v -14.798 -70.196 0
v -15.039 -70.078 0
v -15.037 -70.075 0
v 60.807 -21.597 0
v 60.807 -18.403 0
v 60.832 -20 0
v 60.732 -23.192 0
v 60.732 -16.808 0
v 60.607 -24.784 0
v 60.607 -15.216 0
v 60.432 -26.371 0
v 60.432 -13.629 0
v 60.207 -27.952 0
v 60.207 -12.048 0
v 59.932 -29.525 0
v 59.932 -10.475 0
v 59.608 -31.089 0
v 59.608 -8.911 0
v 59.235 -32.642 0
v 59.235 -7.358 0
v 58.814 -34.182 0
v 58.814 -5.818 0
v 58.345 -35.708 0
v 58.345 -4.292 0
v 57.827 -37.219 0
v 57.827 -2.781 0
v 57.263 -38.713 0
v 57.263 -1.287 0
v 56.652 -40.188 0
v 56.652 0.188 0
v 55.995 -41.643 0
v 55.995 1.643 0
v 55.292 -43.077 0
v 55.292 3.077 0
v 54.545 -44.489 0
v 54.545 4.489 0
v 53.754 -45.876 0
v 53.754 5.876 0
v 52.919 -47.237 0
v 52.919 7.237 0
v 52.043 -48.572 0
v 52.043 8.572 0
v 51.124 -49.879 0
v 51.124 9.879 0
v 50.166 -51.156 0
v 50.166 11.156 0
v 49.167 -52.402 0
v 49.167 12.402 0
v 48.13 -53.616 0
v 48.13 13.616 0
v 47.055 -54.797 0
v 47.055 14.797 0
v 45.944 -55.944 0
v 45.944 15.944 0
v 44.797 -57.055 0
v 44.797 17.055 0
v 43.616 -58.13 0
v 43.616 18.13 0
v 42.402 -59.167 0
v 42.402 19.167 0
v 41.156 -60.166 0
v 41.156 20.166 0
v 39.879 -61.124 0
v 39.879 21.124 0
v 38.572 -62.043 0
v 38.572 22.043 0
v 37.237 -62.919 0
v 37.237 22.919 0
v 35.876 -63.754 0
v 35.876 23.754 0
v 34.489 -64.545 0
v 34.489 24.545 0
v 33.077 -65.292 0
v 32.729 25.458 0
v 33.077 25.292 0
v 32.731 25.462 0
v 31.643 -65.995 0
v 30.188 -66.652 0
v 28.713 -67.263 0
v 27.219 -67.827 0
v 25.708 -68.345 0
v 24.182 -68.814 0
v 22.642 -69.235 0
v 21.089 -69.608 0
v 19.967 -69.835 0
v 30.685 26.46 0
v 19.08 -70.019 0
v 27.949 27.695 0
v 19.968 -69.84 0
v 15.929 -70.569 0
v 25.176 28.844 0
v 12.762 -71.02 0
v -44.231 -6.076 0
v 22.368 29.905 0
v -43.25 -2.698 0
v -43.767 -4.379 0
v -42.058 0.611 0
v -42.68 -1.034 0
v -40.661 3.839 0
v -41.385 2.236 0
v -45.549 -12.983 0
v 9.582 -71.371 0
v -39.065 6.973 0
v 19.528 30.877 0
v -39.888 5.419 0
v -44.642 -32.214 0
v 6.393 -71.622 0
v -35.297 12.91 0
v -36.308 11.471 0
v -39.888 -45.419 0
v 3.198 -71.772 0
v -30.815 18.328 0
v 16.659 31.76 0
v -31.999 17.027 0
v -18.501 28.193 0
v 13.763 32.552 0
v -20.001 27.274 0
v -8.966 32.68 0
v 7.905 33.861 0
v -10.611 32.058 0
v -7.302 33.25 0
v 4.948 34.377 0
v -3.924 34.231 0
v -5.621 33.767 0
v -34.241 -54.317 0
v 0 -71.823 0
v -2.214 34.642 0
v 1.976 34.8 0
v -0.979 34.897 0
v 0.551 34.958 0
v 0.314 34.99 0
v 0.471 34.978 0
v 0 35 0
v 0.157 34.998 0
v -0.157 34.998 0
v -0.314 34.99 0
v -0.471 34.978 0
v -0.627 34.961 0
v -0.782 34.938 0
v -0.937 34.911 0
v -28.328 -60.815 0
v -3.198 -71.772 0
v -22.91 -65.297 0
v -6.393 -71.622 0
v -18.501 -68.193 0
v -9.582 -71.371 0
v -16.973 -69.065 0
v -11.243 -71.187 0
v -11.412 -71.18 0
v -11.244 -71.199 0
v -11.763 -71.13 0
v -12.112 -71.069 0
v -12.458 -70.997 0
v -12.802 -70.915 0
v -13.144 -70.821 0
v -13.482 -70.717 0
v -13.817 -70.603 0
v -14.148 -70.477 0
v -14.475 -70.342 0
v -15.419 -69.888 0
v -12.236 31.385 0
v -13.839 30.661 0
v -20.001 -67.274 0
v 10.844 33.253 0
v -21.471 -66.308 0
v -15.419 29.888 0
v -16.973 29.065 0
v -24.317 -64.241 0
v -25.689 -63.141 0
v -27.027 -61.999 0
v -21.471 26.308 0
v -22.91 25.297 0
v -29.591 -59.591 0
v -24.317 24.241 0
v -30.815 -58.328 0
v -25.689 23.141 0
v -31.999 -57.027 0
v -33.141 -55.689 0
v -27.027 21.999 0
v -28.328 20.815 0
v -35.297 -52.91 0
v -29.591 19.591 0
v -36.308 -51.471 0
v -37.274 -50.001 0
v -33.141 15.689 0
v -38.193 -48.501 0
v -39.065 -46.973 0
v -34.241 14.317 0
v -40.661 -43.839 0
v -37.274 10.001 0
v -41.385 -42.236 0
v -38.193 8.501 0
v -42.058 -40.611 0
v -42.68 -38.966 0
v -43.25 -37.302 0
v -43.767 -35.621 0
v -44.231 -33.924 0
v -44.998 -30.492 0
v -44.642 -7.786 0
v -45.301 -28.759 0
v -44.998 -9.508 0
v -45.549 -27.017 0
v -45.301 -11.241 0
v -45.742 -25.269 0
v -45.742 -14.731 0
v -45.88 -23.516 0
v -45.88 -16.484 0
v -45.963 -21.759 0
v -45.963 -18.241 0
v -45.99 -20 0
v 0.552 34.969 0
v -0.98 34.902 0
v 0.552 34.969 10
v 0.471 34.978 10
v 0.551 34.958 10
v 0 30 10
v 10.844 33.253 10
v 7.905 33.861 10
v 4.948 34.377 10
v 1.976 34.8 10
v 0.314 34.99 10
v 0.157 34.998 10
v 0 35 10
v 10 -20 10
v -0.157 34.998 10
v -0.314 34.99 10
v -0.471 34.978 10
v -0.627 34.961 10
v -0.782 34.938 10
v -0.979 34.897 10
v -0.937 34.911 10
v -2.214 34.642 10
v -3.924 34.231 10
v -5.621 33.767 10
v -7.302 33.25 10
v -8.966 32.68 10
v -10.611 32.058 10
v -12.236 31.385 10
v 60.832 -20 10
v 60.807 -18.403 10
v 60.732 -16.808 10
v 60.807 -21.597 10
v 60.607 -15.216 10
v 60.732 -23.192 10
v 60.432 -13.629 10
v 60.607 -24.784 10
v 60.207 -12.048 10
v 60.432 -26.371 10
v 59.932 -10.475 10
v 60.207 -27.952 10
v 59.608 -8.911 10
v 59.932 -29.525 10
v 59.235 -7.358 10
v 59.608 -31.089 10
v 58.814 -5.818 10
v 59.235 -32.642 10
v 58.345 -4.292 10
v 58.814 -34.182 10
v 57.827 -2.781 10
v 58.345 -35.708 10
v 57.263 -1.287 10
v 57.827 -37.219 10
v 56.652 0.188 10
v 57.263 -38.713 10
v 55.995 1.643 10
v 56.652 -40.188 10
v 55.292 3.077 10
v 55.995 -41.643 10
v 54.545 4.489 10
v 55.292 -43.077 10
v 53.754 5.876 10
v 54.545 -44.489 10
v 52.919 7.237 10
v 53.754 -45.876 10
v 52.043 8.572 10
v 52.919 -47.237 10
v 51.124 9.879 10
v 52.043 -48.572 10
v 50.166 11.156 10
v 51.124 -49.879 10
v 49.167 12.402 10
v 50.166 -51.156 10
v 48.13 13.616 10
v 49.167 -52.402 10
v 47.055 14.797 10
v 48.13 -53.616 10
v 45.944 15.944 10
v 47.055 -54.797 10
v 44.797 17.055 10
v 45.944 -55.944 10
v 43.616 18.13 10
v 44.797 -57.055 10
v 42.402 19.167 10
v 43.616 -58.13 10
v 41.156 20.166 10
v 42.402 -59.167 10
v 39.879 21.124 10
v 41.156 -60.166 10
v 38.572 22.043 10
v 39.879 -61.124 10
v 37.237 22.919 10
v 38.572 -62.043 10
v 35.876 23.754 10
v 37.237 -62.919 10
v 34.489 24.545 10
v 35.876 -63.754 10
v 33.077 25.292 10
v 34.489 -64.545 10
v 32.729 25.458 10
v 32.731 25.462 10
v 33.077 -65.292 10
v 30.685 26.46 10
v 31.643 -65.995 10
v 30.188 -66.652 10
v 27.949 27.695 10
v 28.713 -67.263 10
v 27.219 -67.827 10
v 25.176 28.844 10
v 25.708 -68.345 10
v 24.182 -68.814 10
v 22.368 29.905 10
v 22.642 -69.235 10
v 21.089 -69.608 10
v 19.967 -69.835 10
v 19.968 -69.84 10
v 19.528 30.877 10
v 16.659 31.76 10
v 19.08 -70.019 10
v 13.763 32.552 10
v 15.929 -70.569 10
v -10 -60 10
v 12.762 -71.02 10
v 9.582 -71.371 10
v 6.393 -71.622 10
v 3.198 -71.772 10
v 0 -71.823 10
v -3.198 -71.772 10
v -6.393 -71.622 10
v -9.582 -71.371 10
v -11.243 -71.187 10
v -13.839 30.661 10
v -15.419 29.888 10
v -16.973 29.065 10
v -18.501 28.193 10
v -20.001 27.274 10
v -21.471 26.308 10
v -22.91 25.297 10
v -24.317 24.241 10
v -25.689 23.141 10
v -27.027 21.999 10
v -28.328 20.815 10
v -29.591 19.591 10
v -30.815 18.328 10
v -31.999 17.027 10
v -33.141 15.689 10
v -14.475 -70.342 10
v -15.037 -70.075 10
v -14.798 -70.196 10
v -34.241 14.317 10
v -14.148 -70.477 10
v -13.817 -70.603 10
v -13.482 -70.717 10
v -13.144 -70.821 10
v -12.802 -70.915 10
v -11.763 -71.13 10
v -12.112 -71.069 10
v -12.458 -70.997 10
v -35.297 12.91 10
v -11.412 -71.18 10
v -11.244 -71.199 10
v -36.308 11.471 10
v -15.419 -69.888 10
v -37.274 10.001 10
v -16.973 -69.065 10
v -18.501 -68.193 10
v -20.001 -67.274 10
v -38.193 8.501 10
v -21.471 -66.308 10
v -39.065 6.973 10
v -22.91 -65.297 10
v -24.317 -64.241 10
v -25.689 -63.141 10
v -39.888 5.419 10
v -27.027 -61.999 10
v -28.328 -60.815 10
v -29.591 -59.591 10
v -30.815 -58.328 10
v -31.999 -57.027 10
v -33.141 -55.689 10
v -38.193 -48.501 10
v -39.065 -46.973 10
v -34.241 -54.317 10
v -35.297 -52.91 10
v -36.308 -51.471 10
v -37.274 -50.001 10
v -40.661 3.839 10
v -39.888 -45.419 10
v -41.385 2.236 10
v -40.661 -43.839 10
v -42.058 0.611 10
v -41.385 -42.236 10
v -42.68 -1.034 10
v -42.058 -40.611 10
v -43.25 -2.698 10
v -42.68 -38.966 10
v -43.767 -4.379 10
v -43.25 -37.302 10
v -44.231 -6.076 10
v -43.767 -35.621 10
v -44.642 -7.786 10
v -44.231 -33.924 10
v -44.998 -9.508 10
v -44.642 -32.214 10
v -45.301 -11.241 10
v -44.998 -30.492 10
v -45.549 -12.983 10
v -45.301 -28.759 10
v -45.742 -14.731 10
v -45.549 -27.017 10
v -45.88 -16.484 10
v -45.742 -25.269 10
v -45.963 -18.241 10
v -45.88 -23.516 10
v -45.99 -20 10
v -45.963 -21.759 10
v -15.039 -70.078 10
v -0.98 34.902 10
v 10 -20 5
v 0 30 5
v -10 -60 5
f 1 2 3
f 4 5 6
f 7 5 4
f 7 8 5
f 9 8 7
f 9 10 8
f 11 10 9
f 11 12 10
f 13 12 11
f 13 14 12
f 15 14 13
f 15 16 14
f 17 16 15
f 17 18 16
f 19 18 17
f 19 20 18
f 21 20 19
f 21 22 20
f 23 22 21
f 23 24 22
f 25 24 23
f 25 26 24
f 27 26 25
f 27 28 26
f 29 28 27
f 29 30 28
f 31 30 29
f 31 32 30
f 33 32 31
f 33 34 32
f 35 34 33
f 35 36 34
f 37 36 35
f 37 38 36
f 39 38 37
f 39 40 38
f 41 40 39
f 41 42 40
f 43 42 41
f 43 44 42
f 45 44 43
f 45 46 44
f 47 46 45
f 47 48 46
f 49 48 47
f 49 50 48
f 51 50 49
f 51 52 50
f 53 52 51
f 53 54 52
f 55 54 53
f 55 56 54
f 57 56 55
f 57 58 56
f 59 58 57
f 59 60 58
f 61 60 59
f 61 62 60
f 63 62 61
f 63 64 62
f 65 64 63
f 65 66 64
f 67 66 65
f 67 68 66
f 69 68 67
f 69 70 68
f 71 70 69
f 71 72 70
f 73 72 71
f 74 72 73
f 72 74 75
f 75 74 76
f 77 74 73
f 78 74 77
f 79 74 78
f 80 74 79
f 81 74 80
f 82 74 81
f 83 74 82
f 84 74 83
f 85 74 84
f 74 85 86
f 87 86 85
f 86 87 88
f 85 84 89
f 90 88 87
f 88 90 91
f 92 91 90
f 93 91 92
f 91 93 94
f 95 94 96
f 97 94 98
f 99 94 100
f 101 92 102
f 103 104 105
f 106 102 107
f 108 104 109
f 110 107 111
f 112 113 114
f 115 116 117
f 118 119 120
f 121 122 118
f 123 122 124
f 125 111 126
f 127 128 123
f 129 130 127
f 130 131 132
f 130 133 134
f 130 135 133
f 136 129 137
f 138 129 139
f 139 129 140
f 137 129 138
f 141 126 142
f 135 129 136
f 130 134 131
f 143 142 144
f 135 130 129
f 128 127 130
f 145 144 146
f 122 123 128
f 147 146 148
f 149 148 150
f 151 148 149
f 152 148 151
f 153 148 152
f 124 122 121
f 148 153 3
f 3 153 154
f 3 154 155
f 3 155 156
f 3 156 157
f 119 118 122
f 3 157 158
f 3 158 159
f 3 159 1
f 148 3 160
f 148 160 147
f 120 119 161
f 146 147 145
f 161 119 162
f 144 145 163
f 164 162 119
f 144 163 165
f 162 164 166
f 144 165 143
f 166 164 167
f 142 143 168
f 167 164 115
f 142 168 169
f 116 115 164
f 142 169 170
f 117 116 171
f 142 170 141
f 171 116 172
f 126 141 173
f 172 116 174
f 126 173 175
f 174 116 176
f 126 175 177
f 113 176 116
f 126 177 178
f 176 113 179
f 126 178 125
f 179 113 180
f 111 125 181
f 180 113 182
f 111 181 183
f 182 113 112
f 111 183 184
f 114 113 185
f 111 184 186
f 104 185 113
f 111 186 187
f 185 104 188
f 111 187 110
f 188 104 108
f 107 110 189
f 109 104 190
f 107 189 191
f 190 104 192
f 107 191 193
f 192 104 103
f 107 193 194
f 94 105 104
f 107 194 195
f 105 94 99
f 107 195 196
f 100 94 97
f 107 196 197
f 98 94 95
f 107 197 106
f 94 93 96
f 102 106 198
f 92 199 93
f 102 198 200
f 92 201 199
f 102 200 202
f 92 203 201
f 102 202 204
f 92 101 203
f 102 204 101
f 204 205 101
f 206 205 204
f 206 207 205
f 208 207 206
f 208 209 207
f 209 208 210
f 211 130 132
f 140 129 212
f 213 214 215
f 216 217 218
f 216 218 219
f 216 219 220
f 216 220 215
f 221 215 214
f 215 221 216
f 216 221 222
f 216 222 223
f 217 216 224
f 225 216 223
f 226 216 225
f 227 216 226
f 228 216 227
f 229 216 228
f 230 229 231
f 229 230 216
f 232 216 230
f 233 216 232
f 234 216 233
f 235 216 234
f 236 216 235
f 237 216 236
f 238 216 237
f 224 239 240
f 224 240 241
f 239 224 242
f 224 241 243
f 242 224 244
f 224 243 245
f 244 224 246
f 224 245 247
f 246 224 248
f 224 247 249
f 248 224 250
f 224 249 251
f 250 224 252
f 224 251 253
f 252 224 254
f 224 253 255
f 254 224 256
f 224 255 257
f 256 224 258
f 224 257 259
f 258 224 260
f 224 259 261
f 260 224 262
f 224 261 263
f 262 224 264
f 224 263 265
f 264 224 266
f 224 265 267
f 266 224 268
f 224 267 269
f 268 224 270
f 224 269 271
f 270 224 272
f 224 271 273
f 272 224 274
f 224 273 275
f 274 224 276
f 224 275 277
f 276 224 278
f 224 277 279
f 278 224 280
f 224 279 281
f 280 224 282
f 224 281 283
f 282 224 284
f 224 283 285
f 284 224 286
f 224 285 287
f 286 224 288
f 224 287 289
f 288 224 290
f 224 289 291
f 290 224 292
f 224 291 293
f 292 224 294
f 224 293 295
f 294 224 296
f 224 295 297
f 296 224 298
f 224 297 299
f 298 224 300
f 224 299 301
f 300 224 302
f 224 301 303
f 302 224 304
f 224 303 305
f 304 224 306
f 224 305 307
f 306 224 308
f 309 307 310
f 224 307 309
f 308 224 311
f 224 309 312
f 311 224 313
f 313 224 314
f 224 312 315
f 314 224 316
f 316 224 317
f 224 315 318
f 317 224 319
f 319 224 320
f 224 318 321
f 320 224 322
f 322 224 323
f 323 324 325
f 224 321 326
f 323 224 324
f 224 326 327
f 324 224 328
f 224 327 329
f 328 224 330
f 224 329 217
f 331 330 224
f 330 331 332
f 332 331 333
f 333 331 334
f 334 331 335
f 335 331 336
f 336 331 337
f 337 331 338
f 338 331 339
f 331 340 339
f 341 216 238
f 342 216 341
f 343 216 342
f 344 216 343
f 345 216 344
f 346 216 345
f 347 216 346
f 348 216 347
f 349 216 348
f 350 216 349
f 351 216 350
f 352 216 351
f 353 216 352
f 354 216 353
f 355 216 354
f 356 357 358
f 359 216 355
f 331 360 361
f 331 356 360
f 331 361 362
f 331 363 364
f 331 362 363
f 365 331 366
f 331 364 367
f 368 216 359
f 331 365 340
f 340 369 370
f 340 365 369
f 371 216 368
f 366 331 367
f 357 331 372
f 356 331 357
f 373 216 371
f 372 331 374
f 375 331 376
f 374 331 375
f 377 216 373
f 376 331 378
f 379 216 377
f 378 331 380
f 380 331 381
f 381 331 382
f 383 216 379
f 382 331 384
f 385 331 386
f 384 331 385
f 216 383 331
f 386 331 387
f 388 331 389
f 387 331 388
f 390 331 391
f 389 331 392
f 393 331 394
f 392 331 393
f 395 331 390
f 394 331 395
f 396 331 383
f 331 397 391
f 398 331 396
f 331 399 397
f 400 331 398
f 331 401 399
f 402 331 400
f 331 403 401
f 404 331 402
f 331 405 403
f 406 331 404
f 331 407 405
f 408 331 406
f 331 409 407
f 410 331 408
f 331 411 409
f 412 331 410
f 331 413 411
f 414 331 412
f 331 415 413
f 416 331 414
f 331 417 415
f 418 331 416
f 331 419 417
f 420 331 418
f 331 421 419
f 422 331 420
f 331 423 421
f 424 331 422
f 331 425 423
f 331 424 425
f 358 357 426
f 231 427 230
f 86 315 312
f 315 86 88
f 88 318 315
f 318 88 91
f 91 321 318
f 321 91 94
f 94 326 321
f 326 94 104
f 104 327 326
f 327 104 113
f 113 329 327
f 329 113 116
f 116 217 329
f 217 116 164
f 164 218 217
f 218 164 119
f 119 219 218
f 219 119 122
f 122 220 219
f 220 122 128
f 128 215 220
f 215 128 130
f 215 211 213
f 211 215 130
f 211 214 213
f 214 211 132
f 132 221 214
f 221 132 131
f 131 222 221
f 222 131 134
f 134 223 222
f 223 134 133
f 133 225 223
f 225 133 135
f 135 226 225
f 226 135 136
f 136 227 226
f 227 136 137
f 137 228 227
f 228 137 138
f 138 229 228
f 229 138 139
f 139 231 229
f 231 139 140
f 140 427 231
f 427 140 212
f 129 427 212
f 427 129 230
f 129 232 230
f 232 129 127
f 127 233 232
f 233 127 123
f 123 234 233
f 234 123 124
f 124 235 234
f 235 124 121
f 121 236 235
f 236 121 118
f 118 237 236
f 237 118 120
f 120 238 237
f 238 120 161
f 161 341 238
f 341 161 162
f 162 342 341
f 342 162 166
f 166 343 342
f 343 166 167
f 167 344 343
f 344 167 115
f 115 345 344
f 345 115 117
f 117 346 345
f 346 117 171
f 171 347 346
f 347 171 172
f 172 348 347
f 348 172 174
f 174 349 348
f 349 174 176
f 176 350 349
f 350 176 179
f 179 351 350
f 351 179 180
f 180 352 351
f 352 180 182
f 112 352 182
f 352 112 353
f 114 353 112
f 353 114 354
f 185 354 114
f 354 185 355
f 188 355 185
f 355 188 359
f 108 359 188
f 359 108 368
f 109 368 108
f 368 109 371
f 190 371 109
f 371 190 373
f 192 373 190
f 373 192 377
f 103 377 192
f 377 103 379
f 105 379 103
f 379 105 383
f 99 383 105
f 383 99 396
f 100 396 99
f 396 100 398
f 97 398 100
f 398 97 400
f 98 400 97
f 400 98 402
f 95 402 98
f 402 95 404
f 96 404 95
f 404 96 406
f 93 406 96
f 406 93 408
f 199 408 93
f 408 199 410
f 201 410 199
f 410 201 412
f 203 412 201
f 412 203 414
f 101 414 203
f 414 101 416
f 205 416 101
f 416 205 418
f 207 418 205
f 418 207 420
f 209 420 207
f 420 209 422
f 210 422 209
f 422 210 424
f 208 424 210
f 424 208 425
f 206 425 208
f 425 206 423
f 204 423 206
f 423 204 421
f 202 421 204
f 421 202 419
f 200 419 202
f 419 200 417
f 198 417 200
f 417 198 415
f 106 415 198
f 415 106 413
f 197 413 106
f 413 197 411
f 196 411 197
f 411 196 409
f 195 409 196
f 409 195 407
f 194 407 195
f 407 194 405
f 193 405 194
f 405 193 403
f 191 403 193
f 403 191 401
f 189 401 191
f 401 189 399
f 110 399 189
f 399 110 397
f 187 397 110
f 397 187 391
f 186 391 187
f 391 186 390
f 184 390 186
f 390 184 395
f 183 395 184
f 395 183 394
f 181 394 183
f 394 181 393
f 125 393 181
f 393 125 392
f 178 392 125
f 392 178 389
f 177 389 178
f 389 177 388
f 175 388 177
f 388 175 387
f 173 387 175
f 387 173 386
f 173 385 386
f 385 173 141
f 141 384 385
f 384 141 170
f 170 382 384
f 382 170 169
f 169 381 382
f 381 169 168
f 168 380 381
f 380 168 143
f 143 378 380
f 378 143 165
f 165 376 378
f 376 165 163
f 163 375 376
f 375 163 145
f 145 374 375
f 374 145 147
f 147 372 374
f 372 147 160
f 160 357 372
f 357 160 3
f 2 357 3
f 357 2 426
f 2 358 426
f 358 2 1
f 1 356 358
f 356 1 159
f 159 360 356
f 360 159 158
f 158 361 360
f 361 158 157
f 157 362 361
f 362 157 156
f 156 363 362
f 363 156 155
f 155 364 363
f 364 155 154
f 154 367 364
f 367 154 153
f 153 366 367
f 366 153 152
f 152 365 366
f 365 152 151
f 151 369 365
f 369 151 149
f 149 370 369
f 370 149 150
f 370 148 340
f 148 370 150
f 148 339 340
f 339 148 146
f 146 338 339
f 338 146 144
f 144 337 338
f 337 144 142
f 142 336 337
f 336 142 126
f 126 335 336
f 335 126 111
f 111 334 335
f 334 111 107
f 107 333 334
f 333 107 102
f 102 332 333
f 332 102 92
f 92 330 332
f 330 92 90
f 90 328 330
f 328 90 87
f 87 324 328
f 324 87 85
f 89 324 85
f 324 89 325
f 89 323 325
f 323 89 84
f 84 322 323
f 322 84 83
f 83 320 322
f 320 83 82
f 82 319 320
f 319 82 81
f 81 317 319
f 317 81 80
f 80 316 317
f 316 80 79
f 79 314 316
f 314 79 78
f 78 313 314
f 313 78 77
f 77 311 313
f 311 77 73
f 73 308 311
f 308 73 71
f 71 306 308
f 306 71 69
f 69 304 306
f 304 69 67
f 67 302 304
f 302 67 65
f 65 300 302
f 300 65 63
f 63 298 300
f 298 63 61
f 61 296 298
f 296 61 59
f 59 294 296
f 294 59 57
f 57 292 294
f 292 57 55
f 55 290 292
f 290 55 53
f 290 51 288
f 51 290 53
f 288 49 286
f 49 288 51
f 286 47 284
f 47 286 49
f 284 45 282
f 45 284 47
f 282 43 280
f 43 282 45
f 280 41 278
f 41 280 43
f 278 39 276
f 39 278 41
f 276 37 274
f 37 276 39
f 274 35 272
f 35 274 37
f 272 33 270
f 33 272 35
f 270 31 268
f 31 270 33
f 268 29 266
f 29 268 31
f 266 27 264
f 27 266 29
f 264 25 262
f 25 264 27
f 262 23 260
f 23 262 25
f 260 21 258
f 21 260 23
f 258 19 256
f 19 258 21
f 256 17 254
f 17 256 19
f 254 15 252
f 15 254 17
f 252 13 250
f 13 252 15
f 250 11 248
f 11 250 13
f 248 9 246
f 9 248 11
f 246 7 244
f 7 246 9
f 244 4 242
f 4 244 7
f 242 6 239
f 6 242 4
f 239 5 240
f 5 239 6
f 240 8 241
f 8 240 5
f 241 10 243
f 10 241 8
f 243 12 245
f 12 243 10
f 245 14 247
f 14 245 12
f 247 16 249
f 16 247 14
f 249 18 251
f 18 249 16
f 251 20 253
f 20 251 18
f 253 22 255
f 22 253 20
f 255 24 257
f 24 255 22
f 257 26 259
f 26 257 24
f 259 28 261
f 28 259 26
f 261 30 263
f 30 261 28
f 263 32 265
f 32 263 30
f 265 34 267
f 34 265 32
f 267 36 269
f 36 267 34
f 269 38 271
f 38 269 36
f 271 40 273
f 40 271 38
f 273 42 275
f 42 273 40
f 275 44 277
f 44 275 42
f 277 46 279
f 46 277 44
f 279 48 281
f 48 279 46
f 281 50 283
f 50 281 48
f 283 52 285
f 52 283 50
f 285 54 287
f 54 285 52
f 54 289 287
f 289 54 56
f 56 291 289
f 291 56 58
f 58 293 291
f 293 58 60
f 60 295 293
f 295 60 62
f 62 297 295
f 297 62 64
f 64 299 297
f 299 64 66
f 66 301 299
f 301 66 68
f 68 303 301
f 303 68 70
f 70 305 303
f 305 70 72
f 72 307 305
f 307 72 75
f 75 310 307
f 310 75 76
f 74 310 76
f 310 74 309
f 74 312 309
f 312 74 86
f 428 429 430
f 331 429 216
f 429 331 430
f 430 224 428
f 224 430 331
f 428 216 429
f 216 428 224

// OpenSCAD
// Y coordinate of first vertex A, X coordinate is fixed to 0
ay = 30; // [1:100]

// X coordinate of second vertex B
bx = 10; // [1:100]
// Y coordinate of second vertex B
by = -20; // [-100:-1]

// X coordinate of third vertex C
cx = -10; // [-100:-1]
// Y coordinate of third vertex C
cy = -60; // [-100:-1]

// Additional padding
padding = 5; // [0:100]

// Cut out for original triangle used to generate the curve
cut_out = "half"; // [none, half, through]

/* [Hidden] */
ax = 0;
va = [0, ay];
vb = [bx, by];
vc = [cx, cy];


color( "Gray", 1.0 ) difference() {
     linear_extrude(10) ccw(va, vb, vc, padding);
     if (cut_out == "half") {
        translate([0,0,5]) linear_extrude(6) polygon([va, vb, vc]);
     } else if (cut_out == "through") {
        translate([0,0,-1]) linear_extrude(12) polygon([va, vb, vc]);
     }
}


module ccw(va, vb, vc, padding) {
    
    $fn=200;
    
    ab = distance(va, vb);
    bc = distance(vb, vc);
    ca = distance(vc, va);

    sum_of_long_sides = ab + bc + ca - min(ab, bc, ca);

    vab = vb - va;
    vac = vc - va;
    vba = va - vb;
    vbc = vc - vb;
    vca = va - vc;
    vcb = vb - vc;

    angle_vab = atan2(vab[1], vab[0]);
    angle_vac = atan2(vac[1], vac[0]);
    angle_vba = atan2(vba[1], vba[0]);
    angle_vbc = atan2(vbc[1], vbc[0]);
    angle_vca = atan2(vca[1], vca[0]);
    angle_vcb = atan2(vcb[1], vcb[0]);

    translate(va) sector(sum_of_long_sides + padding - bc,      angle_vab, angle_vac);
    translate(vc) sector(sum_of_long_sides + padding - bc - ca, angle_vac, angle_vbc);
    translate(vb) sector(sum_of_long_sides + padding - ca,      angle_vbc, angle_vba);
    translate(va) sector(sum_of_long_sides + padding - ca - ab,      angle_vba, angle_vca);
    translate(vc) sector(sum_of_long_sides + padding - ab,      angle_vca, angle_vcb);
    translate(vb) sector(sum_of_long_sides + padding - bc - ab, angle_vcb, angle_vab);
}

function distance(p1, p2) = sqrt( pow((p1[0]-p2[0]),2) + pow((p1[1]-p2[1]),2) );

module sector(r, a1, a2) {
    difference(){
        circle(r);
        rotate([0,0,a1]) translate([-r, 0]) square([r*2, r*2]);
        rotate([0,0,a2]) translate([-r, -r*2]) square([r*2, r*2]);
    }
}
